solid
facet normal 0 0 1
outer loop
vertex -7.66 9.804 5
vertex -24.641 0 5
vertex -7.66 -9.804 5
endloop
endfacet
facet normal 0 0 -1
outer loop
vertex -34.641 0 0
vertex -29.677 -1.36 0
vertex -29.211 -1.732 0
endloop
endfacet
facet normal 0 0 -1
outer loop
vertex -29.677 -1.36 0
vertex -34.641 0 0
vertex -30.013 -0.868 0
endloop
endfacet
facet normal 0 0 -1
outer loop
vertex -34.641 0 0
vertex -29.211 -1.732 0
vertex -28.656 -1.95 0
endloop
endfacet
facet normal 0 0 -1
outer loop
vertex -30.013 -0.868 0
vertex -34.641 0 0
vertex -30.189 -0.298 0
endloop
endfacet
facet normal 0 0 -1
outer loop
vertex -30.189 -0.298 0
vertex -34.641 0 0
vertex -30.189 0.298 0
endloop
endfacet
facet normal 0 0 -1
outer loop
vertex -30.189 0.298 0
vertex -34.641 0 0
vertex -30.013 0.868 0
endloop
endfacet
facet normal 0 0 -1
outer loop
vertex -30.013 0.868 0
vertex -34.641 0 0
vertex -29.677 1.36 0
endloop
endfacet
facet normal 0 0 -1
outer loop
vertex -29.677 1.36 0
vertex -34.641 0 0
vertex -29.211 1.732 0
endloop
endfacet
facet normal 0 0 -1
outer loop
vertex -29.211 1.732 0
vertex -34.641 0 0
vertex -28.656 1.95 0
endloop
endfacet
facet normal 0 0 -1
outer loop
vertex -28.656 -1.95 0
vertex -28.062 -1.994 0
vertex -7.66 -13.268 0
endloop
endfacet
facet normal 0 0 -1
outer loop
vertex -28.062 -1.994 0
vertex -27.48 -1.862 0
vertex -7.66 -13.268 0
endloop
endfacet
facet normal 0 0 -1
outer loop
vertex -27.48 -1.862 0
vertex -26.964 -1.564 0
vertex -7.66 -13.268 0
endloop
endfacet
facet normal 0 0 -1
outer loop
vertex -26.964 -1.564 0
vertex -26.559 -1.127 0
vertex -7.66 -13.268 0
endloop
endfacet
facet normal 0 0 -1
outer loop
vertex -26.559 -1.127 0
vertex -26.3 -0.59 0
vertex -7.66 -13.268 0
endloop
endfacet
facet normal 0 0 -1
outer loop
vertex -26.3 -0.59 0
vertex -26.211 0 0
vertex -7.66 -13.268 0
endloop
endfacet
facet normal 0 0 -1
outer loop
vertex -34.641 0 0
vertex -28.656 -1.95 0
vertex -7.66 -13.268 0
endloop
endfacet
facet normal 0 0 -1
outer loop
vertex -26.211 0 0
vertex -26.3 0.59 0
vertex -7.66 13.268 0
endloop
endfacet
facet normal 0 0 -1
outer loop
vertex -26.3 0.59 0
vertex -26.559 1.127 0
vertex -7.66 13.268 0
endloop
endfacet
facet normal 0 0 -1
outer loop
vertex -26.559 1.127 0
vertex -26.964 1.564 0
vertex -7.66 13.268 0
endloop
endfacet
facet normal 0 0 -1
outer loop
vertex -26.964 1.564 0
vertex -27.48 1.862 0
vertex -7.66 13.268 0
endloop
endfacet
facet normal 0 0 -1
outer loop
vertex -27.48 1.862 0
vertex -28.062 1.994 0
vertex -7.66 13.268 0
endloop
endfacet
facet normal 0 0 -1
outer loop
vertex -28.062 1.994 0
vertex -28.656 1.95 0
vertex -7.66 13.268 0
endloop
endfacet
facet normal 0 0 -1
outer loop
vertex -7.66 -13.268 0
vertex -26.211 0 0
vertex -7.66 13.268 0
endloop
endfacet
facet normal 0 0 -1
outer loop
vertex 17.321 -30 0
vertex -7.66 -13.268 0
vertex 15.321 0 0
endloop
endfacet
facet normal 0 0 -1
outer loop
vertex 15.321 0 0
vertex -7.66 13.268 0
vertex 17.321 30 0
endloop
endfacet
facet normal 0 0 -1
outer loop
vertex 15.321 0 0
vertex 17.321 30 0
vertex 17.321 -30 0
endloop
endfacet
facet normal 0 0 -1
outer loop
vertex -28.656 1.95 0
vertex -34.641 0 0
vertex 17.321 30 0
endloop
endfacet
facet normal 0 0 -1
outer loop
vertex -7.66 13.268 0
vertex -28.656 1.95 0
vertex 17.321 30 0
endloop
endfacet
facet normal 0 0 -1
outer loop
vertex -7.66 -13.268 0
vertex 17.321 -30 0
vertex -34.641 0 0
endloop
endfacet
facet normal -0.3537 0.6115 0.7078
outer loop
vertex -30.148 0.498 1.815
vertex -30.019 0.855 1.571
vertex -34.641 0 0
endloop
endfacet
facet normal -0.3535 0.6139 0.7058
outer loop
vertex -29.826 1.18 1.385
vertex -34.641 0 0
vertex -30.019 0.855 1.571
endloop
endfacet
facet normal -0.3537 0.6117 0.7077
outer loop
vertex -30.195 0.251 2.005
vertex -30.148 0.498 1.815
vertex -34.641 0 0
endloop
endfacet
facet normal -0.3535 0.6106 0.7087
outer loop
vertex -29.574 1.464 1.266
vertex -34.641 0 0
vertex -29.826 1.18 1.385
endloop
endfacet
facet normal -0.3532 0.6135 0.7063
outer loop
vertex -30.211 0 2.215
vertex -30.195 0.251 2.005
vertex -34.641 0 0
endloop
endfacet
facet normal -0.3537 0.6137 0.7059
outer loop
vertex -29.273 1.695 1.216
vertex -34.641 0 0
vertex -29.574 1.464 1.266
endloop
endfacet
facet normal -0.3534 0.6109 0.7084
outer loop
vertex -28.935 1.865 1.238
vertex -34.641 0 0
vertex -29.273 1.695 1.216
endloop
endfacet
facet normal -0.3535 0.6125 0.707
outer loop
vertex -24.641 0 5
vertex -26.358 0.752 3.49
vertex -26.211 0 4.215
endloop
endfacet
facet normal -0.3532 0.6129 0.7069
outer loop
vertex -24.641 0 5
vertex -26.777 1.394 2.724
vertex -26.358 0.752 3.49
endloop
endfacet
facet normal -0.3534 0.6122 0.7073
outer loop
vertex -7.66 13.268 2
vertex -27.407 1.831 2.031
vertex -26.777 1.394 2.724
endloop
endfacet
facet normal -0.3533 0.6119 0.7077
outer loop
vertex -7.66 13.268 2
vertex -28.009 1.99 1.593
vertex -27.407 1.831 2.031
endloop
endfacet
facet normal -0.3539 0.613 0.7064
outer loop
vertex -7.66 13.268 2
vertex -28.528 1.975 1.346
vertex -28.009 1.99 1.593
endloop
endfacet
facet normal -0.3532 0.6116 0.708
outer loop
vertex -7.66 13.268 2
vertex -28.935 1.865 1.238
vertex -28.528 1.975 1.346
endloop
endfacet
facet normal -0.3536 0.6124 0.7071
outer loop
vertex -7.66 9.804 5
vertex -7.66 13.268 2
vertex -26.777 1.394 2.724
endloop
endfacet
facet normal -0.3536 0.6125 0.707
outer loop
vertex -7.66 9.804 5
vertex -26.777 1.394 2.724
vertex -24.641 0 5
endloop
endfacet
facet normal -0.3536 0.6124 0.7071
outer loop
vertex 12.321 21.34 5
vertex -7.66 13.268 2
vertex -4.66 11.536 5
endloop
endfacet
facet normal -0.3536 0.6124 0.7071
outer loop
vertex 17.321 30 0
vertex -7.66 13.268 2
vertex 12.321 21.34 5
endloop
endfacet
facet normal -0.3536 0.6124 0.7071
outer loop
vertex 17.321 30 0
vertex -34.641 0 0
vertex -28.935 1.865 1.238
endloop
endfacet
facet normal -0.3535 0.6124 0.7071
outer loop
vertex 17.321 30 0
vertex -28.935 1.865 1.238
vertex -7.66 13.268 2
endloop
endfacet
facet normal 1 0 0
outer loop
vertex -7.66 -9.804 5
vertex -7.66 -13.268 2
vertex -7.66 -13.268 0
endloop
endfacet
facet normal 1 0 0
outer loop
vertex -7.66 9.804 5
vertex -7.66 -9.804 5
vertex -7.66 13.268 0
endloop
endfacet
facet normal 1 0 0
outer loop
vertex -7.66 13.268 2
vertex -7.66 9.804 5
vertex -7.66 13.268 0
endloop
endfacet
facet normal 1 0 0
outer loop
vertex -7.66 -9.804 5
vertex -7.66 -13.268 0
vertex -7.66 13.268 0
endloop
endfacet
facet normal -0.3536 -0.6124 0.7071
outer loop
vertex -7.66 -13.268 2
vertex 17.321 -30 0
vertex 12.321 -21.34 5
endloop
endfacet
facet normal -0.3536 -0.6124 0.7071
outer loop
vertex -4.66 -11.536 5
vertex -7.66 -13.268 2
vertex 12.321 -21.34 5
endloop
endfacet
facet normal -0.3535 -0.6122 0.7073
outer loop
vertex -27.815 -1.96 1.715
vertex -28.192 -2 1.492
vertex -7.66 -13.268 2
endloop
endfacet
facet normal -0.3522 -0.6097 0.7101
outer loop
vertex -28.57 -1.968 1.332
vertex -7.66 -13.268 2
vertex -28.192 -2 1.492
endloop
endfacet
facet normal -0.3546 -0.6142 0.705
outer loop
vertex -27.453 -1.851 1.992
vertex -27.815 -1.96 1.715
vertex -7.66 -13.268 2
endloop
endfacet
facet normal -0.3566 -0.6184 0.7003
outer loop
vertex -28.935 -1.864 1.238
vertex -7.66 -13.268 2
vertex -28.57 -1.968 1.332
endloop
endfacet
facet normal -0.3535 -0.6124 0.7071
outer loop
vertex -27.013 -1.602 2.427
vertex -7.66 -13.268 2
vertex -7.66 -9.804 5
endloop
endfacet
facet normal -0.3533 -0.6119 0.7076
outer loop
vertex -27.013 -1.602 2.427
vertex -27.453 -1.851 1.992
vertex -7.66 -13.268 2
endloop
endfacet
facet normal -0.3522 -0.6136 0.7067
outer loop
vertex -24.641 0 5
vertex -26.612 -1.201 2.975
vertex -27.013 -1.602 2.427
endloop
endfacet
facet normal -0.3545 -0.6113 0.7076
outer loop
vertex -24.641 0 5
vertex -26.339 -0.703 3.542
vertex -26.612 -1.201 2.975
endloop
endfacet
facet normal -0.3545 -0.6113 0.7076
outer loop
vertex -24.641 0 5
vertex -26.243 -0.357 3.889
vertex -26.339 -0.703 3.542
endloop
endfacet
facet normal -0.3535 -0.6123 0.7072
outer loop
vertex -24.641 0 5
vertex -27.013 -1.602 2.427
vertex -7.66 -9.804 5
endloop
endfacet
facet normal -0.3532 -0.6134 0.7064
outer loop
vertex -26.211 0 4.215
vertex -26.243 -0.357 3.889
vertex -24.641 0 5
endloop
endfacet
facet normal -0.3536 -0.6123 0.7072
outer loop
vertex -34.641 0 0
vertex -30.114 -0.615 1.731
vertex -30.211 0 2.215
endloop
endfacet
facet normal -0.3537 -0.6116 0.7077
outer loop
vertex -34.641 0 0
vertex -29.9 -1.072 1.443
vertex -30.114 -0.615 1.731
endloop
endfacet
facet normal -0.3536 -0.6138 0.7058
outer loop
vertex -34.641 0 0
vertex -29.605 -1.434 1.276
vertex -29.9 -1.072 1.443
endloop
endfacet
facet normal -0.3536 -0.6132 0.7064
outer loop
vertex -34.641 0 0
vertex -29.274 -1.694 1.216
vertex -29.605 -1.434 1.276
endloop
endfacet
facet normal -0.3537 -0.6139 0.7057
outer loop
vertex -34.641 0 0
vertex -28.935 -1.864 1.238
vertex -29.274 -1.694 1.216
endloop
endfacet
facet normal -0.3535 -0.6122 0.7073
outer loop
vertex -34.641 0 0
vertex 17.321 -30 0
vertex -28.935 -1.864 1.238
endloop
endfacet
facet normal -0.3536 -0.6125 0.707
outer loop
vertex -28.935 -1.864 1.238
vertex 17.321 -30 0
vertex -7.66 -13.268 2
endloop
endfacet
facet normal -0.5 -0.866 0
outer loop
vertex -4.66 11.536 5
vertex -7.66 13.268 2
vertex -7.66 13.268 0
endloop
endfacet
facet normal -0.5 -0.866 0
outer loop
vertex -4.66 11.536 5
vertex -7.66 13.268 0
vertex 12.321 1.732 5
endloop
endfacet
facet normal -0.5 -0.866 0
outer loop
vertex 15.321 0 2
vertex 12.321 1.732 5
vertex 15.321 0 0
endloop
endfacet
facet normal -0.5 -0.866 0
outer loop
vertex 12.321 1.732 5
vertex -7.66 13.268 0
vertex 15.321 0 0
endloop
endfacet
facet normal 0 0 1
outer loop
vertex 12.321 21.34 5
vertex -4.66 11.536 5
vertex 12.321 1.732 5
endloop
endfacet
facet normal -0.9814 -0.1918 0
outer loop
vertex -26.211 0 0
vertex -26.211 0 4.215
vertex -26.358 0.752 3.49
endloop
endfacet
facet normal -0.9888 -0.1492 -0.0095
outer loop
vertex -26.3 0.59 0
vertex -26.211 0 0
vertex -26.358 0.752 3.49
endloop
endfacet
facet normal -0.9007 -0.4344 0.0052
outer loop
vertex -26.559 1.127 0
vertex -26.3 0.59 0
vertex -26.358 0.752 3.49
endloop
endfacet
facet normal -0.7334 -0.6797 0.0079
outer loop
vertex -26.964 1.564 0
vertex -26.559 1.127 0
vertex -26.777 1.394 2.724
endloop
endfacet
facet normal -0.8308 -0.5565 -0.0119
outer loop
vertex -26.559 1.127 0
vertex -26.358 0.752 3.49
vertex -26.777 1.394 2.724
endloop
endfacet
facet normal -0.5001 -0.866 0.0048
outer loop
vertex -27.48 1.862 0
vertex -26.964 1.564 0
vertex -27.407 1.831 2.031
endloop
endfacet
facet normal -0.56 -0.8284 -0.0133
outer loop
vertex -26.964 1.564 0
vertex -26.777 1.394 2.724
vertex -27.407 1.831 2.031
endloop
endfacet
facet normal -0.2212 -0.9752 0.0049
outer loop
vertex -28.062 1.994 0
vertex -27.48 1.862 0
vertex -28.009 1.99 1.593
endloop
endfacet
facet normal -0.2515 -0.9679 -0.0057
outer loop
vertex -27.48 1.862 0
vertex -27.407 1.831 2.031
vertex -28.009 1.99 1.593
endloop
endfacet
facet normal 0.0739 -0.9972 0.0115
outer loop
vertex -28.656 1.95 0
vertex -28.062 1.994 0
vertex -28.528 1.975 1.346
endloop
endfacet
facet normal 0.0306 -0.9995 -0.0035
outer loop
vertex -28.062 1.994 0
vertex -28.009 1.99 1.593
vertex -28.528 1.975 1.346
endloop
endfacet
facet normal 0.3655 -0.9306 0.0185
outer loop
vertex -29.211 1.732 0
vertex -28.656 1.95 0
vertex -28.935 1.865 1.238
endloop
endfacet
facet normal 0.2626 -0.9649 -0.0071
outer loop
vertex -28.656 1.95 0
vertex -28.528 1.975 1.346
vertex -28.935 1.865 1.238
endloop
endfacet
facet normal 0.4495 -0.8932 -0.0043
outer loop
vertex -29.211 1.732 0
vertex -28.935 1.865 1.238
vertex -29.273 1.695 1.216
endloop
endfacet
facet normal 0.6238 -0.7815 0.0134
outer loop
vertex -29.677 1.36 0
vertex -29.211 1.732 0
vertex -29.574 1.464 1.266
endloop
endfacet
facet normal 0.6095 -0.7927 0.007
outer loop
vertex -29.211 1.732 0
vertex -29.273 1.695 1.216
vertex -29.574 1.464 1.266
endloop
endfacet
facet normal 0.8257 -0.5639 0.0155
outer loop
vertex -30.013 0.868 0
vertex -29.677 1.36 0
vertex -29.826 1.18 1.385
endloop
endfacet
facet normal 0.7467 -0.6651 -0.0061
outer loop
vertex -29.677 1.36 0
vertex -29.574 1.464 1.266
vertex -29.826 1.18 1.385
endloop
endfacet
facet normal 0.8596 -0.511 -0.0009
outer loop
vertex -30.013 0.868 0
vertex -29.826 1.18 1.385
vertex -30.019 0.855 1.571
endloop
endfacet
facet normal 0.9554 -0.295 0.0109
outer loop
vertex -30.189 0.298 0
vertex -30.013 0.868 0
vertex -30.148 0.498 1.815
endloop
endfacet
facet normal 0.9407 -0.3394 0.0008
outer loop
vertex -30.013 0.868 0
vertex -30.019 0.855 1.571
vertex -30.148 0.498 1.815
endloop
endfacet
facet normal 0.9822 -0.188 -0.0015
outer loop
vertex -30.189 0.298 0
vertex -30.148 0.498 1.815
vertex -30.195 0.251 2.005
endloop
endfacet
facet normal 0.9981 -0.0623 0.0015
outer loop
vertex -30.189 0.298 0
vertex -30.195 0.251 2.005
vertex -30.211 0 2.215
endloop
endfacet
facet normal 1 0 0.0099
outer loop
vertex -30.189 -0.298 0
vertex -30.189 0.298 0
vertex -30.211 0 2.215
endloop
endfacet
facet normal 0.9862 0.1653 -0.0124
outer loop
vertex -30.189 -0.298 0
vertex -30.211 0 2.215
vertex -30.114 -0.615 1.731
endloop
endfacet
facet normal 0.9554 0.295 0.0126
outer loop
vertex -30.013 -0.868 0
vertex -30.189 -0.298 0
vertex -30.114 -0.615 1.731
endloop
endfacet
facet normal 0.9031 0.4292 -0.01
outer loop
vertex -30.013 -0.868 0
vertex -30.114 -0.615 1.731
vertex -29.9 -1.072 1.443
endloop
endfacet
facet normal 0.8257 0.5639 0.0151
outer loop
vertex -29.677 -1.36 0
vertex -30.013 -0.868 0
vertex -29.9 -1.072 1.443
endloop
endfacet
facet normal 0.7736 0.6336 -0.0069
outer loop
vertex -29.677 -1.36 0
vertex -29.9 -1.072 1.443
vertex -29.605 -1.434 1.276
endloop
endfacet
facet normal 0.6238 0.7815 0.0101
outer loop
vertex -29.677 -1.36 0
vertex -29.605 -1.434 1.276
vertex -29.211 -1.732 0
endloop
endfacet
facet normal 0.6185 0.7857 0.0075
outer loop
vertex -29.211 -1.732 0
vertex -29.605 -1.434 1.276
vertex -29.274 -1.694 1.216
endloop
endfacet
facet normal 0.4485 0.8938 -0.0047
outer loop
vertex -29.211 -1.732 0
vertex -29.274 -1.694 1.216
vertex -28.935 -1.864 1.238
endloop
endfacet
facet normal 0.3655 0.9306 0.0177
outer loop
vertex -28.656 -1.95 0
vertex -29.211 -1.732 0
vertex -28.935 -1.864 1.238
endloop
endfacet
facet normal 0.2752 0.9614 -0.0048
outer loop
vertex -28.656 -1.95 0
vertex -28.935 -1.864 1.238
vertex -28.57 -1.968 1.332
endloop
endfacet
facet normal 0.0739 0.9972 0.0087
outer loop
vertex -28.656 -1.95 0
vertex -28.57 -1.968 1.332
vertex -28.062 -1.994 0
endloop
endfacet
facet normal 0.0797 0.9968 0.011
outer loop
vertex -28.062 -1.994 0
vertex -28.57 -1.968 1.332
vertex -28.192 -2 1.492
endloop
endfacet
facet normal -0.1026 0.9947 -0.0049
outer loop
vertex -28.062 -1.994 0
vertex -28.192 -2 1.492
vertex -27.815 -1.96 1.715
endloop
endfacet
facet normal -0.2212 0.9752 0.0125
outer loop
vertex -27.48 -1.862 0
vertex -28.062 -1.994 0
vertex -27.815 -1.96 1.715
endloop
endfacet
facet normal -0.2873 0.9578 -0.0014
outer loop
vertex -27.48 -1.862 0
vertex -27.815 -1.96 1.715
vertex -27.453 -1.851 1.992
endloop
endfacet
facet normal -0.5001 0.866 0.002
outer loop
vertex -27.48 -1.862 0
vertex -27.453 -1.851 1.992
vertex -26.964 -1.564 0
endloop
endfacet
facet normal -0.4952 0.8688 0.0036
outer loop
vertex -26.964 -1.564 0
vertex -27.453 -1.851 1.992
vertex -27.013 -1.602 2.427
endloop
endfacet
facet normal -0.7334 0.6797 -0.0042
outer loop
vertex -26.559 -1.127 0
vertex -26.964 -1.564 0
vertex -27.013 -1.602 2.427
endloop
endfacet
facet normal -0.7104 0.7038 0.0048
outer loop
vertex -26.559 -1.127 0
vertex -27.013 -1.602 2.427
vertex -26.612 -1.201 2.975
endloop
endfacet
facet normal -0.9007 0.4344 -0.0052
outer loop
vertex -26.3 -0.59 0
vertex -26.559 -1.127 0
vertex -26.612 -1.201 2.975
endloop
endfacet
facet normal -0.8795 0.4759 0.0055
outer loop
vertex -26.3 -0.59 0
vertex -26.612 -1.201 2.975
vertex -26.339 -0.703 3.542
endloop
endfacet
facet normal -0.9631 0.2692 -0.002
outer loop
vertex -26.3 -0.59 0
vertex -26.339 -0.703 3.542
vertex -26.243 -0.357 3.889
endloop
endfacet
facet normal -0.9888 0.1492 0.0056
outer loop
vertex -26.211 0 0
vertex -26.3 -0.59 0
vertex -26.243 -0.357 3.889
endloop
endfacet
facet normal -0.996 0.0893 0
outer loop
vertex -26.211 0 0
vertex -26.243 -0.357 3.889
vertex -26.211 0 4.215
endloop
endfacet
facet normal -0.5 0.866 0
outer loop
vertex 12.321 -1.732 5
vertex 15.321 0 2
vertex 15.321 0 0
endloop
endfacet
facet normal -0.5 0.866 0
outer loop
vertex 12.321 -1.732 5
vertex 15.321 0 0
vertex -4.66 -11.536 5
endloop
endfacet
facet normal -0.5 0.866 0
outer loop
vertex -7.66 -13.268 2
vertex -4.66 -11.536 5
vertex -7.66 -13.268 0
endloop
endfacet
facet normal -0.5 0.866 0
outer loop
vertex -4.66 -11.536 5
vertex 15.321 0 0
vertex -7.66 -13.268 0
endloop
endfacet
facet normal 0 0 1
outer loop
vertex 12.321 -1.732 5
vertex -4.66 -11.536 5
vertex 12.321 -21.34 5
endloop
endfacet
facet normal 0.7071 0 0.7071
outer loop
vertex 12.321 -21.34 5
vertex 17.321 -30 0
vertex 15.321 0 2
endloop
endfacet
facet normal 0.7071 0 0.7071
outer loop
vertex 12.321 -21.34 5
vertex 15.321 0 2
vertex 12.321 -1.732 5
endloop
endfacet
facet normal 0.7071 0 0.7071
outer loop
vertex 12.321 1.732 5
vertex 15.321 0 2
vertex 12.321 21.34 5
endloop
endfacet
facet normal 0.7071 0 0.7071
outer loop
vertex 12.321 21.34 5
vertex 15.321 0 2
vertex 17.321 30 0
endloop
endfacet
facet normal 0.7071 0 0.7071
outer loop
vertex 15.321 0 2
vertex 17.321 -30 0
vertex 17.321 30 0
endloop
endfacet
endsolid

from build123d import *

# Parameters (mm, degrees)
F1_DEPTH    = 5
F2_R        = 2
F3_DEPTH    = 25
F4_T1_DEPTH = 85.7168298797
F4_T3_DEPTH = 85.7168298797
F4_T5_DEPTH = 85.7168298797


# Not quite as in the source:
# - a fillet or chamfer that OpenCascade refuses, or shapes differently, is made with other operations: its cross-section is extruded or revolved along the edge and cut away or added


with BuildPart() as f1:
    # F0 (on Top) → F1 (new body)
    with BuildSketch(Plane.XY):
        Polygon((17.3205080757, -30), (17.3205080757, 30), (-34.6410161514, 0), align=None)
        Polygon((-7.6602540378, -13.2679491924), (-7.6602540378, 13.2679491924), (15.3205080757, 0), align=None, mode=Mode.SUBTRACT)
    extrude(amount=F1_DEPTH)

    # F2 (on face) → F3 (cut)
    with BuildSketch(Plane.XY.offset(5)):
        with Locations((-28.2111279666, 0)):
            Circle(F2_R)
    extrude(amount=-F3_DEPTH, mode=Mode.SUBTRACT)

    # F4: chamfer of 5 on 3 edges, made by hand

    # F4_s2 → F4_t1 (cut)
    with BuildSketch(Plane(origin=(37.1164761038, 21.4292074699, 0), x_dir=(0, 0, 1), z_dir=(-0.8660254038, -0.5, 0))):
        Polygon((0, 17.3205080757), (5, 12.3205080757), (5, 17.3205080757), align=None)
    extrude(amount=F4_T1_DEPTH, mode=Mode.SUBTRACT)

    # F4_s4 → F4_t3 (cut)
    with BuildSketch(Plane.XZ.offset(-42.8584149398)):
        Polygon((17.3205080757, 0), (12.3205080757, 5), (17.3205080757, 5), align=None)
    extrude(amount=F4_T3_DEPTH, mode=Mode.SUBTRACT)

    # F4_s6 → F4_t5 (cut)
    with BuildSketch(Plane(origin=(-37.1164761038, 21.4292074699, 0), x_dir=(0, 0, 1), z_dir=(0.8660254038, -0.5, 0))):
        Polygon((0, 17.3205080757), (5, 12.3205080757), (5, 17.3205080757), align=None)
    extrude(amount=F4_T5_DEPTH, mode=Mode.SUBTRACT)


solid = f1.part
